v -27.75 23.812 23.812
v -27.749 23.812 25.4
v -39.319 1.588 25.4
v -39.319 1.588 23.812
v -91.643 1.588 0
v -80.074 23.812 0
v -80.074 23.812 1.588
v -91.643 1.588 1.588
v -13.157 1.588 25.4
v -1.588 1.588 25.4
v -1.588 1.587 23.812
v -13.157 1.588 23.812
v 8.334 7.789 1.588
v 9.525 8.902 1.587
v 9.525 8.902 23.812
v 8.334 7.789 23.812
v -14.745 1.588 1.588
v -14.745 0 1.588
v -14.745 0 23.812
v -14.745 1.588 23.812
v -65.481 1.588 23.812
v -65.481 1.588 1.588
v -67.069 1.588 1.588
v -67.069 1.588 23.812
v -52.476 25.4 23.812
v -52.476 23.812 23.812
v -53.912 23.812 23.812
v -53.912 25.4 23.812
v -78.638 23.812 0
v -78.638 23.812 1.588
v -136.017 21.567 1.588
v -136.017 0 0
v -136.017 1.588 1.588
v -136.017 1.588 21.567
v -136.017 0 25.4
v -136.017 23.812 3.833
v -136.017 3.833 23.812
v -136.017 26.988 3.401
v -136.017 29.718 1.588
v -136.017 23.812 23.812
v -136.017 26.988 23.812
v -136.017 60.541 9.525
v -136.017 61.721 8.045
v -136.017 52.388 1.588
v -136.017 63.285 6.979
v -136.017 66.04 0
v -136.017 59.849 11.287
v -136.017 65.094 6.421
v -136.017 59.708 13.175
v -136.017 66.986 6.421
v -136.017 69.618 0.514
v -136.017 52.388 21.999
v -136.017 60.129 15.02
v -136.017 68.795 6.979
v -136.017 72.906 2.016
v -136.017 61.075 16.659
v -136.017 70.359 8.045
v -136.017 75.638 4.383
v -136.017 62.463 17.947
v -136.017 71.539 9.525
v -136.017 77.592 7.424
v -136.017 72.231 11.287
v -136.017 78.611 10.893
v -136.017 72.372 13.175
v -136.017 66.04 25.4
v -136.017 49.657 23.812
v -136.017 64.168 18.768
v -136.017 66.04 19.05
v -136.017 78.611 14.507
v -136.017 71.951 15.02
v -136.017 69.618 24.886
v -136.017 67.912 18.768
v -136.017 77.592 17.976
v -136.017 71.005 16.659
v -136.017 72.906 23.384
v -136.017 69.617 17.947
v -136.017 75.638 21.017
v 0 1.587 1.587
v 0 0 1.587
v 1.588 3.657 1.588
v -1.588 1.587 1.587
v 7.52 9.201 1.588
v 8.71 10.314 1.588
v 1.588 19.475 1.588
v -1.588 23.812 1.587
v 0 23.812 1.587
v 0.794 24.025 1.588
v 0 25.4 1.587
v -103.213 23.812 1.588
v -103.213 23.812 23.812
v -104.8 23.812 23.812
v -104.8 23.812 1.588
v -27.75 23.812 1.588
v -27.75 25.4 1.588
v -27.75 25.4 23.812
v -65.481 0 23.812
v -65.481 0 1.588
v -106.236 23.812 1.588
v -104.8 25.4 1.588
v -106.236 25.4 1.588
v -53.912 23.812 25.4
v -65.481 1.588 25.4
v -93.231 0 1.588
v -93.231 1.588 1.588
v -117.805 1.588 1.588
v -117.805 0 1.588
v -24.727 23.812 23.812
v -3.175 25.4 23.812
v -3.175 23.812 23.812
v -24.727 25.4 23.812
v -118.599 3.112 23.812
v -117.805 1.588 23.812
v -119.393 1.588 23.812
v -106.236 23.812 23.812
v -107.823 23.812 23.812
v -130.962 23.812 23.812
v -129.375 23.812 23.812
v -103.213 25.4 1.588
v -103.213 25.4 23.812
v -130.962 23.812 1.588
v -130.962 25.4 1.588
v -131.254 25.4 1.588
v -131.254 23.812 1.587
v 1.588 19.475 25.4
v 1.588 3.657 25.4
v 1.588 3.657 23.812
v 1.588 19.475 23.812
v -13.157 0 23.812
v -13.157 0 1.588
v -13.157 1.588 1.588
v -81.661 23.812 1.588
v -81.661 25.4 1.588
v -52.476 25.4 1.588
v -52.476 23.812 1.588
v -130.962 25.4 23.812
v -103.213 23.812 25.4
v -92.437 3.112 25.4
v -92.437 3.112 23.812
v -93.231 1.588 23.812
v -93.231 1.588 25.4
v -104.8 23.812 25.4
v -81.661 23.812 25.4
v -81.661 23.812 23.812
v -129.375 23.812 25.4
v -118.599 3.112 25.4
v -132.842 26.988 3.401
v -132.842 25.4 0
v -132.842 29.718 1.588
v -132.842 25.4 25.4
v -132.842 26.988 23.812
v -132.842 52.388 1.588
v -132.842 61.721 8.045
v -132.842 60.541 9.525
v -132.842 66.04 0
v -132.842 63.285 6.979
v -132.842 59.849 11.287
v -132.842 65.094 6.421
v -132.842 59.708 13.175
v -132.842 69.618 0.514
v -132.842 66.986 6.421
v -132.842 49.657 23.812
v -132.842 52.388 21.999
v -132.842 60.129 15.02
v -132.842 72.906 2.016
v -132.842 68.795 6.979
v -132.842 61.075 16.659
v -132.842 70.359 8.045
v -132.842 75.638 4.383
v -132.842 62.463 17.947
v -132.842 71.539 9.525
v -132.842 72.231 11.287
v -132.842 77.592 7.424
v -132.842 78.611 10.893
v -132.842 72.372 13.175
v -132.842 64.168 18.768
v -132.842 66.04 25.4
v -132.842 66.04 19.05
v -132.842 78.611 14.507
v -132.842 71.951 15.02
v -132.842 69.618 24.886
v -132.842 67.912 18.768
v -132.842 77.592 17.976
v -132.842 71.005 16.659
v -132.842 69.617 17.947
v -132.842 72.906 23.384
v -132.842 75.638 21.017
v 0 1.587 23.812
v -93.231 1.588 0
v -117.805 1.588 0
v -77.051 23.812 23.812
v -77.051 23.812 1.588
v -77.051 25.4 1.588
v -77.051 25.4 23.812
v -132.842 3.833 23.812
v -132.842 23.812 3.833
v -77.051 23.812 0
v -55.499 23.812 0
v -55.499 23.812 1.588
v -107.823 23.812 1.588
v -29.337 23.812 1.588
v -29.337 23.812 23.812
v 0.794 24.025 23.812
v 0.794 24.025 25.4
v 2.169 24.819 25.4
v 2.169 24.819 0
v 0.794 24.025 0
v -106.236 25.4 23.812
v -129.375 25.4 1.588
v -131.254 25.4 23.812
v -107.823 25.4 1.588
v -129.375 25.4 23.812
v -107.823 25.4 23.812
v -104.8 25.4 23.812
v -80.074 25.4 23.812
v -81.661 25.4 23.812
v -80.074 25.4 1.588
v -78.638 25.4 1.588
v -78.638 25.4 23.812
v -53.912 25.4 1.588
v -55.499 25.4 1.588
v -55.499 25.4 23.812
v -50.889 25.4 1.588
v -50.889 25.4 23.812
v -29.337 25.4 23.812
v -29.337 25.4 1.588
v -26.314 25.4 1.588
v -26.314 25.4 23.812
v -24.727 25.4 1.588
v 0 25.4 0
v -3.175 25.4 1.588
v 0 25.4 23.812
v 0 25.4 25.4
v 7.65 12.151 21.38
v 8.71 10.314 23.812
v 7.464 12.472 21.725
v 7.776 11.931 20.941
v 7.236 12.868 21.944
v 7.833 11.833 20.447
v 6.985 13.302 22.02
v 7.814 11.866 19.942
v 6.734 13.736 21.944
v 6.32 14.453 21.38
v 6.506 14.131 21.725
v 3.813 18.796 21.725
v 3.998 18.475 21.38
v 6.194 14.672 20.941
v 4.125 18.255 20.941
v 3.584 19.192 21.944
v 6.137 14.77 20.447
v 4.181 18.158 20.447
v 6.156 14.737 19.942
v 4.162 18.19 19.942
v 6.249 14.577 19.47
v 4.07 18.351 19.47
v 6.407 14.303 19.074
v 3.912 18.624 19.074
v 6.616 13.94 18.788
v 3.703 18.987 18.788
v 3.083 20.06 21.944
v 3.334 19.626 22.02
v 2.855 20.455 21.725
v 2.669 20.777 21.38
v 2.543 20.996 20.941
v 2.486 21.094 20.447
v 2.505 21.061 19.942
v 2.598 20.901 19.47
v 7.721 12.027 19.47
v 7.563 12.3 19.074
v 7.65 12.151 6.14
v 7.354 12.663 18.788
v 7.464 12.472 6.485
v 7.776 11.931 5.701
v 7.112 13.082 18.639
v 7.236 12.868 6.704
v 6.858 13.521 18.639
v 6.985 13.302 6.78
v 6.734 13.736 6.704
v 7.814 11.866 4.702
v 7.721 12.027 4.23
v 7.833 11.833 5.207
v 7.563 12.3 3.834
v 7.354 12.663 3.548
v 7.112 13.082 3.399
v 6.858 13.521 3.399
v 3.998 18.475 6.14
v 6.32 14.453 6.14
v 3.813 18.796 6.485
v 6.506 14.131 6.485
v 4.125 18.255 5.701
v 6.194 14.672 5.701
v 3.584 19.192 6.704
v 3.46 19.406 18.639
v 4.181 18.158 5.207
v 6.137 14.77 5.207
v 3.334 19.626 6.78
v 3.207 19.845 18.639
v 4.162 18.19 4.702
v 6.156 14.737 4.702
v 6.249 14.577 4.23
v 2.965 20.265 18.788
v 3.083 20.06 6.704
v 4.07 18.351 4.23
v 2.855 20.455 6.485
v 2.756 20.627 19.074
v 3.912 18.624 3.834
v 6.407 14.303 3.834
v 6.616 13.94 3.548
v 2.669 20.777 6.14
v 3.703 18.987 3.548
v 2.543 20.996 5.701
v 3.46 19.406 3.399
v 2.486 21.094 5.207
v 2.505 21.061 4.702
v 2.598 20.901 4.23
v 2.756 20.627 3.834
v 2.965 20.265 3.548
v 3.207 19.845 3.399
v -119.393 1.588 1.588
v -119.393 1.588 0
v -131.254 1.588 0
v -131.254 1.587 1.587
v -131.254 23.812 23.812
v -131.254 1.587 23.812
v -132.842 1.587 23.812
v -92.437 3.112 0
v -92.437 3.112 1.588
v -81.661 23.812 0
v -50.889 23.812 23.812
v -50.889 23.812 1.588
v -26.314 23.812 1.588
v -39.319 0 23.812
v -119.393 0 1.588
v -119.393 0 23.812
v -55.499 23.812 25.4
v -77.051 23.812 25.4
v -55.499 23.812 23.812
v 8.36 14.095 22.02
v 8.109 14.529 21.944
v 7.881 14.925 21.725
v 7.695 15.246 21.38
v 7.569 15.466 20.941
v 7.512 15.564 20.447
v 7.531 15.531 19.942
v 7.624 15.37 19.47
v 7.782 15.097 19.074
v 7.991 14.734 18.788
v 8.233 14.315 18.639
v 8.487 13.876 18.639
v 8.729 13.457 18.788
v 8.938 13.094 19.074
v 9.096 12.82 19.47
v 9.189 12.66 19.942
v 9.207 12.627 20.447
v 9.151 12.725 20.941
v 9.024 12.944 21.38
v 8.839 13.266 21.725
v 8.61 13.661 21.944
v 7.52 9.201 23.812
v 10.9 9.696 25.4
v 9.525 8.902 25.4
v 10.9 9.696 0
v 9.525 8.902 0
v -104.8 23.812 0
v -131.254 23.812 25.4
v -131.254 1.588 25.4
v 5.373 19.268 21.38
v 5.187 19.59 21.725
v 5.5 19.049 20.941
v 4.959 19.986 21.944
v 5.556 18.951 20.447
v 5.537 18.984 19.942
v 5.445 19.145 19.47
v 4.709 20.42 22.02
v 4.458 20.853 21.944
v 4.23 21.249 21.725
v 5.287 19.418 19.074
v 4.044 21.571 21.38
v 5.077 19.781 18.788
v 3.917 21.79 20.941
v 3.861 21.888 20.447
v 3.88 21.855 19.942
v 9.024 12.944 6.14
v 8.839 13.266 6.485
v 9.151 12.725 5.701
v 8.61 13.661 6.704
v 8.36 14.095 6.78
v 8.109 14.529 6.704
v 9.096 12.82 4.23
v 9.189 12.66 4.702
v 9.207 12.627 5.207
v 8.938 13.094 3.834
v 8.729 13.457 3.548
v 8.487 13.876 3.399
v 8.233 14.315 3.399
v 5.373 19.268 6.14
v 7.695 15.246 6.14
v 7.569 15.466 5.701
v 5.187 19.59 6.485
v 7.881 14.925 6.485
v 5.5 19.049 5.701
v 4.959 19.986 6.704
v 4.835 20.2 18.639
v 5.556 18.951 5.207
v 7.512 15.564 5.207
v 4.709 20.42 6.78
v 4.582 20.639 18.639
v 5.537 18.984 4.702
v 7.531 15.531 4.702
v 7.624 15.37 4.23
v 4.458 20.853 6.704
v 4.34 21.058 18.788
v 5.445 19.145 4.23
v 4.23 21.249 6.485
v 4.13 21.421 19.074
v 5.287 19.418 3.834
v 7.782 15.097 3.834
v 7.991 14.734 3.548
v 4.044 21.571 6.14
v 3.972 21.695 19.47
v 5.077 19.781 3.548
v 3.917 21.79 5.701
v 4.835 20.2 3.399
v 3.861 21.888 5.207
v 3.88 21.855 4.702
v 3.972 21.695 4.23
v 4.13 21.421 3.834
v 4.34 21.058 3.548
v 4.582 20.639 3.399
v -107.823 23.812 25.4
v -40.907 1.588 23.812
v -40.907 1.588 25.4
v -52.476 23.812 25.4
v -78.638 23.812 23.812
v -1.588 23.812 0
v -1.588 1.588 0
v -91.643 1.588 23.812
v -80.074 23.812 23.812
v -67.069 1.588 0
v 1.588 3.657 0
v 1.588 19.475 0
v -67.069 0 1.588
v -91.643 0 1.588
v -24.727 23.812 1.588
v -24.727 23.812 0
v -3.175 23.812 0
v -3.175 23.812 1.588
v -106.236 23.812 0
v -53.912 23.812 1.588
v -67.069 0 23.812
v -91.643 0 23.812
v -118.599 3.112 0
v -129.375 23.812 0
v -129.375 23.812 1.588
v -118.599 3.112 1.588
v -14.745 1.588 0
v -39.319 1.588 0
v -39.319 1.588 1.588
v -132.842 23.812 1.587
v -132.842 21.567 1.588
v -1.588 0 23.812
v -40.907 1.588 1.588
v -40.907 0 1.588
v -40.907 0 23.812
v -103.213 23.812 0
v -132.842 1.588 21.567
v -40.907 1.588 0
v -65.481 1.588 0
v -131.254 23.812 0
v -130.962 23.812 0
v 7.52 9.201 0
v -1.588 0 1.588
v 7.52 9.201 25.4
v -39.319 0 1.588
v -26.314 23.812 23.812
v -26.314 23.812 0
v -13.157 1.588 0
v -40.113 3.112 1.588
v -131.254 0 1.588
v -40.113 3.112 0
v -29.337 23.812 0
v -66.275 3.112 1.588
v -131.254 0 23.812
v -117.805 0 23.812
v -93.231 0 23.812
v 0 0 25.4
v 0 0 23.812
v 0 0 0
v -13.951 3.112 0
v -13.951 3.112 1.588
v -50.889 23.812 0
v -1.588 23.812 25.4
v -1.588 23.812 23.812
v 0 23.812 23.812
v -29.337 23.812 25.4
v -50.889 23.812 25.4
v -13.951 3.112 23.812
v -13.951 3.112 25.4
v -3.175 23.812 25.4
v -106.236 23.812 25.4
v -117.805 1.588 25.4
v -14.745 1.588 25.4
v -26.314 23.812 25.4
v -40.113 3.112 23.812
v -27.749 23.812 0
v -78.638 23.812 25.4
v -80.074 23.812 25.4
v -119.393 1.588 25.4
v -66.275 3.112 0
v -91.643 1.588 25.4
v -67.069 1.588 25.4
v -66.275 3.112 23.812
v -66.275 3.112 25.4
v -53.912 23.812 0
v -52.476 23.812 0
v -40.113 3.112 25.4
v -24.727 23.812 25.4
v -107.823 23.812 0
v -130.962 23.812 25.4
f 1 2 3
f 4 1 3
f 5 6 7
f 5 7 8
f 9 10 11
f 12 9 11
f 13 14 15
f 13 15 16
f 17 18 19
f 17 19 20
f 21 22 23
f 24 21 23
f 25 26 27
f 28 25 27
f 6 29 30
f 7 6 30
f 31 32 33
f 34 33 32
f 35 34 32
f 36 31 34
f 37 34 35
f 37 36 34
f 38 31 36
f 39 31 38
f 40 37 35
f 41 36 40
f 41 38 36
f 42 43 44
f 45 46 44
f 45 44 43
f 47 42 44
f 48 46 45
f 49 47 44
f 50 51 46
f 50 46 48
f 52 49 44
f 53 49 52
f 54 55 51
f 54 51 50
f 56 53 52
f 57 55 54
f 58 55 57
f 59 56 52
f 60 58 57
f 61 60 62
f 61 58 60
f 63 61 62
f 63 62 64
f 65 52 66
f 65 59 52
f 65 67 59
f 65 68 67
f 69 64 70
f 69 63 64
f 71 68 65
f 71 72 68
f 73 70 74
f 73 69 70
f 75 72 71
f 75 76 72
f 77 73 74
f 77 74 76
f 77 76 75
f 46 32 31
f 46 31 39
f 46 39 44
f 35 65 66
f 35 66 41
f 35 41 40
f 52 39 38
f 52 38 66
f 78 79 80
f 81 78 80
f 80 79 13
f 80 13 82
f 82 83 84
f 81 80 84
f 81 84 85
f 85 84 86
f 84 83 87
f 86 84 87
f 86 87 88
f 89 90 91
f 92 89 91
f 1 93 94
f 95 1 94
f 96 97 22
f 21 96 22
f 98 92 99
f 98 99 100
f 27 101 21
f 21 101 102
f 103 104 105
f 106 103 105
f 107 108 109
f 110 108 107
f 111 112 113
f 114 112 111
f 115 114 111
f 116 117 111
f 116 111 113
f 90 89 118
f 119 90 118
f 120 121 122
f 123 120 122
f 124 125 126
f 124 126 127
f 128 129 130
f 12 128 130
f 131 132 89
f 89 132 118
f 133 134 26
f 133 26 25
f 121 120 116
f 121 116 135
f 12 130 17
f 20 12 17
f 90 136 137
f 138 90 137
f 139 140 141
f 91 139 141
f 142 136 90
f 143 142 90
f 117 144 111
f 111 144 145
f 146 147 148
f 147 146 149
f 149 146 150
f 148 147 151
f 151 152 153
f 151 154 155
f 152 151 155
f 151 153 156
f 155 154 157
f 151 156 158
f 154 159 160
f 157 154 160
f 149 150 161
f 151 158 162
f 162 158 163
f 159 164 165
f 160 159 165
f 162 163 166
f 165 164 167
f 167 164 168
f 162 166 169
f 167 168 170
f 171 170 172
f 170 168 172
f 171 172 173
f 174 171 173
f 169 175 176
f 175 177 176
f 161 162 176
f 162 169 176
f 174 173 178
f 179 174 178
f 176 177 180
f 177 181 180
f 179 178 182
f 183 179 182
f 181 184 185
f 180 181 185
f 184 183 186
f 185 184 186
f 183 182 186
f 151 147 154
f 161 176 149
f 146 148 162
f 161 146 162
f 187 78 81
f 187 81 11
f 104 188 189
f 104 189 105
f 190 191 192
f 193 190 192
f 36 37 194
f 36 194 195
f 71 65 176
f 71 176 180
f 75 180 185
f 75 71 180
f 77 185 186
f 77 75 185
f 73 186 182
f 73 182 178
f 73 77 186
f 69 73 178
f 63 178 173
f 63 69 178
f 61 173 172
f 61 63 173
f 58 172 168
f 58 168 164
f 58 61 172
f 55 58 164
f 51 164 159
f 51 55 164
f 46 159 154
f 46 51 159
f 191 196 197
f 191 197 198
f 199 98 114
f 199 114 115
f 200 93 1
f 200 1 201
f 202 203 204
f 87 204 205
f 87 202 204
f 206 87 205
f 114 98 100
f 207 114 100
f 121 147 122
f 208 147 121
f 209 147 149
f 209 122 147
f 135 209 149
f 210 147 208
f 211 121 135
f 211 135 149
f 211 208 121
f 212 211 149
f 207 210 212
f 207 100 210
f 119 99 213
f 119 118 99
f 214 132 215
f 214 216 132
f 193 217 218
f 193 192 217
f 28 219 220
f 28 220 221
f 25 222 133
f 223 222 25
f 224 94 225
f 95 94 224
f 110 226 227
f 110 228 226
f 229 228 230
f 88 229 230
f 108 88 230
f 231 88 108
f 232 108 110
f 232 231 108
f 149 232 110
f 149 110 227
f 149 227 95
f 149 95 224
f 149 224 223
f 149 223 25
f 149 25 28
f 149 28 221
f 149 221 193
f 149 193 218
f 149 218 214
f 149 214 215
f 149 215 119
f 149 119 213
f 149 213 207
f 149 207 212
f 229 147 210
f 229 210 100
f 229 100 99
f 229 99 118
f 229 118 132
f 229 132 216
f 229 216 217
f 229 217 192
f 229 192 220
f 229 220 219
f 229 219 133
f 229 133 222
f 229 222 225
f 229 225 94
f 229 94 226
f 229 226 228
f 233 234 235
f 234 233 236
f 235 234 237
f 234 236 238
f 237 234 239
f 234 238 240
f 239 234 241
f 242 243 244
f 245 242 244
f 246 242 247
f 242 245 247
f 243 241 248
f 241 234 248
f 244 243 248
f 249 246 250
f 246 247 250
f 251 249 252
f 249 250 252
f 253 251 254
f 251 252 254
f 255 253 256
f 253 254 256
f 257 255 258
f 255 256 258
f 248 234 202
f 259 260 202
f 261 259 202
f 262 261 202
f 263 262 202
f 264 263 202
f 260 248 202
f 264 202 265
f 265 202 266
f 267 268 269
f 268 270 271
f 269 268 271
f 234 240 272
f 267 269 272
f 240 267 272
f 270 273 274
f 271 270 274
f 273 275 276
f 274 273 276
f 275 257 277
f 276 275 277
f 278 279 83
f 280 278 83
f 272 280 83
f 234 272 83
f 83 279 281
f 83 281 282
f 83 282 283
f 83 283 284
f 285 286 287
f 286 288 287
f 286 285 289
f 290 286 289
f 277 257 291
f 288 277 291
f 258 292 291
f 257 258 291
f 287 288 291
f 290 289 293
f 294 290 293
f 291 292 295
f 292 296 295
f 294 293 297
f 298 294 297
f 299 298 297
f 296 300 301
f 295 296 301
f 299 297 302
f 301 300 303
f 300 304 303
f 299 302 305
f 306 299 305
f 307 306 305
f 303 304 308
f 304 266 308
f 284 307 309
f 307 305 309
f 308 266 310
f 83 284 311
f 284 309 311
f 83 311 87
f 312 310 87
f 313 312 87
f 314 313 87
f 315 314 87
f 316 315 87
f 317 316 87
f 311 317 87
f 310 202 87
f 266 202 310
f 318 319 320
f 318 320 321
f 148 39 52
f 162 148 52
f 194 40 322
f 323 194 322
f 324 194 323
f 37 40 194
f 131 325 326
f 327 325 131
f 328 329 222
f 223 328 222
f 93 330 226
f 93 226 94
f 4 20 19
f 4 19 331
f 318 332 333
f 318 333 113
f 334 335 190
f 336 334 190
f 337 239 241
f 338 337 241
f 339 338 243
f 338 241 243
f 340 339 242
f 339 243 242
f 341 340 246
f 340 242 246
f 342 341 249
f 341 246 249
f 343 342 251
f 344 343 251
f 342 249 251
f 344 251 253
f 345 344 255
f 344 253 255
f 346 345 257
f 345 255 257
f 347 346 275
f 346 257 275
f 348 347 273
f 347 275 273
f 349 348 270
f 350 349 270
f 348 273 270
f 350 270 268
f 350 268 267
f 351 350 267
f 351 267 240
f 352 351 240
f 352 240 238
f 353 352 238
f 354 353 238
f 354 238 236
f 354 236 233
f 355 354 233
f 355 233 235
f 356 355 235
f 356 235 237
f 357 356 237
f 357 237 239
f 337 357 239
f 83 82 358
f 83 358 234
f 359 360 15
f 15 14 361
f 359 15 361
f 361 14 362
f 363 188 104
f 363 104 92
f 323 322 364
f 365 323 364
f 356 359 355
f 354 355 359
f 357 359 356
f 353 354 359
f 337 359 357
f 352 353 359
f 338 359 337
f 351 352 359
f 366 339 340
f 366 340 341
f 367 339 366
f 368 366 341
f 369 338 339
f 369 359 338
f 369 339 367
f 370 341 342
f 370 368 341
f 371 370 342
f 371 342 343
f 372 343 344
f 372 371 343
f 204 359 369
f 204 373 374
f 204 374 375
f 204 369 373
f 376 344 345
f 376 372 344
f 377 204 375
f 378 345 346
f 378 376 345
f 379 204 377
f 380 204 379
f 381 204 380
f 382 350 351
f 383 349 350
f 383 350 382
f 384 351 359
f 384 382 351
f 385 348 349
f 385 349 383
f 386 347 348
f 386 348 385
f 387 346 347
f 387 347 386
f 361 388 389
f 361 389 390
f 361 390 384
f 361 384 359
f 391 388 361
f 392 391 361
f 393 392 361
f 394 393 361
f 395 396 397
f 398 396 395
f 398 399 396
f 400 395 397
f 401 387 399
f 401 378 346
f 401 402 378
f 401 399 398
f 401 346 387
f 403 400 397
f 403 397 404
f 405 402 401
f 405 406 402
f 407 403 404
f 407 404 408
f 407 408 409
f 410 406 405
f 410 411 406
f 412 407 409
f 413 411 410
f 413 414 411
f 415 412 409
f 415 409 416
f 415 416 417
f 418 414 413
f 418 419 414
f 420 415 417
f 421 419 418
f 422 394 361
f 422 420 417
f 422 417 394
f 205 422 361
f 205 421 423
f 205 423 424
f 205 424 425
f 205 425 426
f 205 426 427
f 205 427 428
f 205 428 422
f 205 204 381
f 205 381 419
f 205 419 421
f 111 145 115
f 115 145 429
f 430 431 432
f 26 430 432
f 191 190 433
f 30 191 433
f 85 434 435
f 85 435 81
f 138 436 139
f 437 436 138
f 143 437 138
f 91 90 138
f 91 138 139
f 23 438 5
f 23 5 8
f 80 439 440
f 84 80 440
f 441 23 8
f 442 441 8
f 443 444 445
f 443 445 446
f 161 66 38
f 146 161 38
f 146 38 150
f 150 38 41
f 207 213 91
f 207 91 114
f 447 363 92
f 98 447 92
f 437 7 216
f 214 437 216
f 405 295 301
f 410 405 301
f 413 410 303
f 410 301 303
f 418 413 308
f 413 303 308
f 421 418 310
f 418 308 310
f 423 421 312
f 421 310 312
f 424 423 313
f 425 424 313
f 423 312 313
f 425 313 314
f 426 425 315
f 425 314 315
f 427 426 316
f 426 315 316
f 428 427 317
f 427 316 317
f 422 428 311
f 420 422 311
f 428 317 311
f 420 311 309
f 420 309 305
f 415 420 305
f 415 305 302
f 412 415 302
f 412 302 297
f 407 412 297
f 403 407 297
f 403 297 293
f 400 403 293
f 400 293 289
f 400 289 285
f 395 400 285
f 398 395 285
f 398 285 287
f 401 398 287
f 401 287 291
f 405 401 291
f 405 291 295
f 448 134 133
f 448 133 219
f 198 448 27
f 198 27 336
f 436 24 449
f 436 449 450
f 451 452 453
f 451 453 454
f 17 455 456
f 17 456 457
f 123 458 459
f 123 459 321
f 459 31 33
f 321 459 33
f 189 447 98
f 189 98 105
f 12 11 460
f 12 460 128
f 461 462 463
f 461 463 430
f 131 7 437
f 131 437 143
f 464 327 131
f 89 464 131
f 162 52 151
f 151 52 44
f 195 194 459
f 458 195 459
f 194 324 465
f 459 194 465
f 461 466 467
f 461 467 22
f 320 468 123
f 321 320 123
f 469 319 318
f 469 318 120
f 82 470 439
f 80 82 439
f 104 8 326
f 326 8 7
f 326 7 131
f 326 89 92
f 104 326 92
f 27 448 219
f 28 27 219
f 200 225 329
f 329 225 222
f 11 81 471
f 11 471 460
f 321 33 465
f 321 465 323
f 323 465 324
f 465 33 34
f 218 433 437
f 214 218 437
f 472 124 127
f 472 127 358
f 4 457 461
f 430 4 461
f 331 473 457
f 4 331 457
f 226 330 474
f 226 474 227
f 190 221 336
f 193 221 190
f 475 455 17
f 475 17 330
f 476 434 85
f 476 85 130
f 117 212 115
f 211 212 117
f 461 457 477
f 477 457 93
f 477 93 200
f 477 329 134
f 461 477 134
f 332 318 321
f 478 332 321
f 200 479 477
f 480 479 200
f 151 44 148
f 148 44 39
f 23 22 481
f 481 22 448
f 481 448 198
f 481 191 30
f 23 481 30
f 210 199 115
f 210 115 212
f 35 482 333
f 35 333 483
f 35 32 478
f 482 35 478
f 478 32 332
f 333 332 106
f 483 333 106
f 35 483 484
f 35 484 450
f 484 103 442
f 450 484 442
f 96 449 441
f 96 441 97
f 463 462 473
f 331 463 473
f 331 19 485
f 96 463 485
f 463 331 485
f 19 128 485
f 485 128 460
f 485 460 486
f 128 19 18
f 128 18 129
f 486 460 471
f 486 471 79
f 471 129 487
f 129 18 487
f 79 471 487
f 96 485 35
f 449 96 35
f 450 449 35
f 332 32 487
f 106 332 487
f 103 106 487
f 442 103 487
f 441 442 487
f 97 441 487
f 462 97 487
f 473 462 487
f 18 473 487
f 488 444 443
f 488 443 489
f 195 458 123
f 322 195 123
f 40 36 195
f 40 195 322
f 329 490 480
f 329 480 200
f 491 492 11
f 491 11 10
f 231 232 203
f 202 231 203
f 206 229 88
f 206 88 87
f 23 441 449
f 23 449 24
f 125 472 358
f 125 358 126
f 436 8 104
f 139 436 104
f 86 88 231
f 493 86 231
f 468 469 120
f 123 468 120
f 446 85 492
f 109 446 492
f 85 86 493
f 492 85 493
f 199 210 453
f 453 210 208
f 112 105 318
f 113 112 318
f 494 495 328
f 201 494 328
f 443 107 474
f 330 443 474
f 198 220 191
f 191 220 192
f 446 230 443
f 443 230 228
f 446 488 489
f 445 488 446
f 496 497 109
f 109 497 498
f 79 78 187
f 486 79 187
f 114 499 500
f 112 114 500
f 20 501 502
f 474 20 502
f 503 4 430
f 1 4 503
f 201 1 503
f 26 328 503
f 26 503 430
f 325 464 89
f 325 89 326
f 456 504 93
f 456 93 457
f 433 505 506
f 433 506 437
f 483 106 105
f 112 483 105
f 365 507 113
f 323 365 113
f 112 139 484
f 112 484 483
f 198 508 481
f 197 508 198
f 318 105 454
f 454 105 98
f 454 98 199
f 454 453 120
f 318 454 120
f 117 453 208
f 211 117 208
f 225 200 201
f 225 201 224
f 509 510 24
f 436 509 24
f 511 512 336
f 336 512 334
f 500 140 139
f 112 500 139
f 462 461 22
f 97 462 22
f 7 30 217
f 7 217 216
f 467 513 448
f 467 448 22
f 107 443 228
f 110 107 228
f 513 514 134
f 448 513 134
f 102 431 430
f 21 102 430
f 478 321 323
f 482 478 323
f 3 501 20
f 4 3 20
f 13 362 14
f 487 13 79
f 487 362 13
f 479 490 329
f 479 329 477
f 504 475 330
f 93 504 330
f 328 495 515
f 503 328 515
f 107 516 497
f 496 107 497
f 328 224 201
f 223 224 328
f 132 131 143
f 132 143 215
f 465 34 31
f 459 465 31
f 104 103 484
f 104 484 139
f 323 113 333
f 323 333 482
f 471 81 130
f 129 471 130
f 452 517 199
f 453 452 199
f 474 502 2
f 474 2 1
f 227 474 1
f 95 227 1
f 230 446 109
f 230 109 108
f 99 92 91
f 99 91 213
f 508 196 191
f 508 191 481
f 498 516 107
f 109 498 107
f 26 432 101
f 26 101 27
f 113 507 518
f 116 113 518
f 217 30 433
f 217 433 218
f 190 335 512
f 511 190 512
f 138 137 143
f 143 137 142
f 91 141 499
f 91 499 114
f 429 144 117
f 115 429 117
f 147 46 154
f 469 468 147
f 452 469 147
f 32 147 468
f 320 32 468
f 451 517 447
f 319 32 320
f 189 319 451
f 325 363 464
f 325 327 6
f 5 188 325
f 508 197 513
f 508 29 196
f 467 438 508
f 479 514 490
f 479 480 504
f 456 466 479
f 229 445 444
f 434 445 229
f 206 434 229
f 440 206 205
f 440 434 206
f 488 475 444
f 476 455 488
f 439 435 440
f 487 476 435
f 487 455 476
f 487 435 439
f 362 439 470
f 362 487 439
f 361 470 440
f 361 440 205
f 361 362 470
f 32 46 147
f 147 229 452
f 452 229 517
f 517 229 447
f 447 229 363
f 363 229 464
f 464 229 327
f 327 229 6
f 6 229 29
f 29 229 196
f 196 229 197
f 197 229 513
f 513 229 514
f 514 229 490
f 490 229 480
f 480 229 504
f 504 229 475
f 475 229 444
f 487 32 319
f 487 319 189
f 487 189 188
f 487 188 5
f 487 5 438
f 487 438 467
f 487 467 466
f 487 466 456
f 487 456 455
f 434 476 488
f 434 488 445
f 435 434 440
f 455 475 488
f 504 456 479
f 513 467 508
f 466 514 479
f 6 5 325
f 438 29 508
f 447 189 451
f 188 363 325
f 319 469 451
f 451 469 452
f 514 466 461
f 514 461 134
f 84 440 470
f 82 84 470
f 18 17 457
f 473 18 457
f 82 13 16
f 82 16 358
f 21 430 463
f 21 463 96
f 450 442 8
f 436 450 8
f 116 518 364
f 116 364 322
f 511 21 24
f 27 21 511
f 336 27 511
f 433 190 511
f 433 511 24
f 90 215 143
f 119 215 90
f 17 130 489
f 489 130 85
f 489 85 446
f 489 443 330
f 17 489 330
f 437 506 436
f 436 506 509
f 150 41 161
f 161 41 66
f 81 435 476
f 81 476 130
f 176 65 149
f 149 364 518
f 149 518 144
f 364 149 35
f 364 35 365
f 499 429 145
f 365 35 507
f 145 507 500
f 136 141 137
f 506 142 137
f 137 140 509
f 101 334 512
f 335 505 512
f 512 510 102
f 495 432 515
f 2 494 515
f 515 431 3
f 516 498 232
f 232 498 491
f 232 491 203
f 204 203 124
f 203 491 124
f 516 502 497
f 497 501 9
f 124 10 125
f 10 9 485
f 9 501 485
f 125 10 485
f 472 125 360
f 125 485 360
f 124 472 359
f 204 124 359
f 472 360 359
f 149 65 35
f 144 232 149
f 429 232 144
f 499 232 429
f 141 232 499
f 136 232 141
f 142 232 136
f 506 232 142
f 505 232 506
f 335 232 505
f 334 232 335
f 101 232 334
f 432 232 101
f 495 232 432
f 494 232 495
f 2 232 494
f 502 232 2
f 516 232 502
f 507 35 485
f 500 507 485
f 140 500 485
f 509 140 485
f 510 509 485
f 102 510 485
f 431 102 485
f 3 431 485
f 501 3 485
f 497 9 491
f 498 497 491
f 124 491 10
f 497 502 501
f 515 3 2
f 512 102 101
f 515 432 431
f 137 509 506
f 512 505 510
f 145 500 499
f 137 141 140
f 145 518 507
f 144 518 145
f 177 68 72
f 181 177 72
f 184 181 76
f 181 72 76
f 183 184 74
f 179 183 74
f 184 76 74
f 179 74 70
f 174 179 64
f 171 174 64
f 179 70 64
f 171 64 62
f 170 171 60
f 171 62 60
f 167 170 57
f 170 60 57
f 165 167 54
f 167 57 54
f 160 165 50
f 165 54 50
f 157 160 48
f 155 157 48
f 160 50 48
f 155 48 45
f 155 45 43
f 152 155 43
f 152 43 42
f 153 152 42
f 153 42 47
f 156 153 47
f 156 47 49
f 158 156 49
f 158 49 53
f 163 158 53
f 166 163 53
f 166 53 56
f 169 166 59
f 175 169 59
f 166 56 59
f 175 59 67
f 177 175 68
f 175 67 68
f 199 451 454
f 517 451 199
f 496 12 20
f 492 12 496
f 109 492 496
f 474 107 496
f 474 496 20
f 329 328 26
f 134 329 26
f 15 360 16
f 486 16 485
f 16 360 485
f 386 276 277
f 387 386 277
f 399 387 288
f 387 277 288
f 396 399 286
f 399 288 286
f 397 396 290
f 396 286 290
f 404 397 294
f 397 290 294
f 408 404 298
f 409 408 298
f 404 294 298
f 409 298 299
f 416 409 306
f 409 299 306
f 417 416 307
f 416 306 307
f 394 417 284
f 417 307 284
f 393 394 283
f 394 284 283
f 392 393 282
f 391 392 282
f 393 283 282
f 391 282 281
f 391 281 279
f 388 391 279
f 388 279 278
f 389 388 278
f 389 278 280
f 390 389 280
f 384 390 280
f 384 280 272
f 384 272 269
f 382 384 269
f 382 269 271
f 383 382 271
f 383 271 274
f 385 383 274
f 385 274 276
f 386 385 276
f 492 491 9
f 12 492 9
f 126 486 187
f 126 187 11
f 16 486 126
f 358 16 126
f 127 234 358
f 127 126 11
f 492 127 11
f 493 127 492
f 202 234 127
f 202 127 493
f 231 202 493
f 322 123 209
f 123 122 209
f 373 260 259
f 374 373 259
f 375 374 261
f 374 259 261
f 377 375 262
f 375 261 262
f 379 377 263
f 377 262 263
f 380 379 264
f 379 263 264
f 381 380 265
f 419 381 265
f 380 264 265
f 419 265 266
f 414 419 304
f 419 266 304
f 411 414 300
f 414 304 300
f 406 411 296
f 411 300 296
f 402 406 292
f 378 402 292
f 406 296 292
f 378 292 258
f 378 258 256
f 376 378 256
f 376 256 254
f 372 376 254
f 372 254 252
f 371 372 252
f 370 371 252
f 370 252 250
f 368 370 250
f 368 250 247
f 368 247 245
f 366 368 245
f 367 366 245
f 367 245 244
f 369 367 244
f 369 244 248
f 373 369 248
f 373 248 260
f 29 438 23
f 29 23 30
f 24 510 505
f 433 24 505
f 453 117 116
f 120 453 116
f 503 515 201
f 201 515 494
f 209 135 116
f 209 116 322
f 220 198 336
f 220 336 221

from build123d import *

# Parameters (mm, degrees)
BOSS_EXTRUDE1_DEPTH      = 1.5875
SKETCH2_W                = 1.5875
SKETCH2_H                = 1.5875
BOSS_EXTRUDE2_DEPTH      = 132.842
SKETCH3_W                = 25.4
SKETCH3_H                = 25.4
SKETCH3_W_2              = 22.225
SKETCH3_H_2              = 22.225
BOSS_EXTRUDE3_DEPTH      = 1.5875
BOSS_EXTRUDE4_START      = -1.5875
BOSS_EXTRUDE4_DEPTH      = 22.225
BOSS_EXTRUDE5_DEPTH      = 1.5875
LPATTERN1_COUNT          = 5
LPATTERN1_PITCH          = 26.162
MIRROR6_COPY_1_DEPTH     = 1.5875
MIRROR6_COPY_2_DEPTH     = 1.5875
MIRROR6_COPY_3_DEPTH     = 1.5875
MIRROR6_COPY_4_DEPTH     = 1.5875
BOSS_EXTRUDE6_START      = -1.5875
SKETCH10_W               = 1.5875
SKETCH10_H               = 1.5875
BOSS_EXTRUDE6_DEPTH      = 22.225
LPATTERN2_COUNT          = 5
LPATTERN2_PITCH          = 26.162
SKETCH12_W               = 25.4
SKETCH12_H               = 17.4625
BOSS_EXTRUDE13_DEPTH     = 1.5875
M3_CLEARANCE_HOLE1_D     = 3.4
M3_CLEARANCE_HOLE1_DEPTH = 1.5875
SKETCH19_W               = 3.175
SKETCH19_H               = 25.4
BOSS_EXTRUDE14_DEPTH     = 66.04
BOSS_EXTRUDE15_DEPTH     = 3.175
SKETCH21_R               = 6.35
CUT_EXTRUDE1_DEPTH       = 3.175


with BuildPart() as part:
    # Sketch1 → Boss-Extrude1 (new body)
    with BuildSketch(Plane.XY):
        Polygon((0, 0), (0, 25.4), (9.525, 8.902216058), align=None)
        Polygon((7.519534439, 9.200784302), (1.5875, 3.656610839), (1.5875, 19.475369343), align=None, mode=Mode.SUBTRACT)
    extrude(amount=BOSS_EXTRUDE1_DEPTH)

    # Sketch2 → Boss-Extrude2 (add)
    with BuildSketch(Plane.ZY):
        with Locations((0.79375, 24.60625)):
            Rectangle(SKETCH2_W, SKETCH2_H)
        with Locations((0.79375, 0.79375)):
            Rectangle(SKETCH2_W, SKETCH2_H)
    extrude(amount=BOSS_EXTRUDE2_DEPTH)

    # Sketch3 → Boss-Extrude3 (add)
    with BuildSketch(Plane.ZY.offset(132.842)):
        with Locations((12.7, 12.7)):
            Rectangle(SKETCH3_W, SKETCH3_H)
        with Locations((12.7, 12.7)):
            Rectangle(SKETCH3_W_2, SKETCH3_H_2, mode=Mode.SUBTRACT)
    boss_extrude3 = extrude(amount=-BOSS_EXTRUDE3_DEPTH)

    # Mirror4: part across plane


with BuildPart() as part_1:
    add(part.part)
    add(part.part.mirror(Plane.XY.offset(12.7)))

    # Mirror5: Boss-Extrude3 across plane
    add(boss_extrude3.mirror(Plane(origin=(-66.421, 0, 0), x_dir=(0, 0, 1), z_dir=(1, 0, 0))))

    # Sketch7 → Boss-Extrude4 (add)
    with BuildSketch(Plane(origin=(0, 0, 0), x_dir=(-1, 0, 0), z_dir=(0, 0, -1)).offset(BOSS_EXTRUDE4_START)):
        Polygon((-9.525, 8.902216058), (-8.334375, 7.789439051), (-7.519534439, 9.200784302), (-8.710159439, 10.313561309), align=None)
    extrude(amount=-BOSS_EXTRUDE4_DEPTH)

    # Sketch9 → Boss-Extrude5 (add)
    with BuildSketch(Plane(origin=(0, 0, 0), x_dir=(-1, 0, 0), z_dir=(0, 0, -1))):
        Polygon((1.5875, 23.8125), (13.157102699, 1.5875), (14.744602699, 1.5875), (26.314205397, 23.8125), (24.726705397, 23.8125), (13.950852699, 3.112279563), (3.175, 23.8125), align=None)
    boss_extrude5 = extrude(amount=-BOSS_EXTRUDE5_DEPTH)

    # LPattern1: Boss-Extrude5 ×5
    with Locations(*[(-i * LPATTERN1_PITCH, 0, 0) for i in range(1, LPATTERN1_COUNT)]):
        add(boss_extrude5)

    # Mirror6: Boss-Extrude5 across plane
    add(boss_extrude5.mirror(Plane.XY.offset(12.7)))

    # Mirror6 copy 1 sketch → Mirror6 copy 1 (add)
    with BuildSketch(Plane(origin=(-26.162, 0, 25.4), x_dir=(-1, 0, 0), z_dir=(0, 0, 1))):
        Polygon((1.5875, -23.8125), (13.157102699, -1.5875), (14.744602699, -1.5875), (26.314205397, -23.8125), (24.726705397, -23.8125), (13.950852699, -3.112279563), (3.175, -23.8125), align=None)
    extrude(amount=-MIRROR6_COPY_1_DEPTH)

    # Mirror6 copy 2 sketch → Mirror6 copy 2 (add)
    with BuildSketch(Plane(origin=(-52.324, 0, 25.4), x_dir=(-1, 0, 0), z_dir=(0, 0, 1))):
        Polygon((1.5875, -23.8125), (13.157102699, -1.5875), (14.744602699, -1.5875), (26.314205397, -23.8125), (24.726705397, -23.8125), (13.950852699, -3.112279563), (3.175, -23.8125), align=None)
    extrude(amount=-MIRROR6_COPY_2_DEPTH)

    # Mirror6 copy 3 sketch → Mirror6 copy 3 (add)
    with BuildSketch(Plane(origin=(-78.486, 0, 25.4), x_dir=(-1, 0, 0), z_dir=(0, 0, 1))):
        Polygon((1.5875, -23.8125), (13.157102699, -1.5875), (14.744602699, -1.5875), (26.314205397, -23.8125), (24.726705397, -23.8125), (13.950852699, -3.112279563), (3.175, -23.8125), align=None)
    extrude(amount=-MIRROR6_COPY_3_DEPTH)

    # Mirror6 copy 4 sketch → Mirror6 copy 4 (add)
    with BuildSketch(Plane(origin=(-104.648, 0, 25.4), x_dir=(-1, 0, 0), z_dir=(0, 0, 1))):
        Polygon((1.5875, -23.8125), (13.157102699, -1.5875), (14.744602699, -1.5875), (26.314205397, -23.8125), (24.726705397, -23.8125), (13.950852699, -3.112279563), (3.175, -23.8125), align=None)
    extrude(amount=-MIRROR6_COPY_4_DEPTH)

    # Sketch10 → Boss-Extrude6 (add)
    with BuildSketch(Plane(origin=(0, 0, 0), x_dir=(-1, 0, 0), z_dir=(0, 0, -1)).offset(BOSS_EXTRUDE6_START)):
        with Locations((118.598852699, 0.79375)):
            Rectangle(SKETCH10_W, SKETCH10_H)
        with Locations((130.168455397, 24.60625)):
            Rectangle(SKETCH10_W, SKETCH10_H)
        with Locations((107.02925, 24.60625)):
            Rectangle(SKETCH10_W, SKETCH10_H)
    boss_extrude6 = extrude(amount=-BOSS_EXTRUDE6_DEPTH)

    # LPattern2: Boss-Extrude6 ×5
    with Locations(*[(i * LPATTERN2_PITCH, 0, 0) for i in range(1, LPATTERN2_COUNT)]):
        add(boss_extrude6)

    # Sketch12 → Boss-Extrude13 (add)
    with BuildSketch(Plane(origin=(10.998522628, 6.35, 0), x_dir=(0, 0, -1), z_dir=(0.8660254037844415, 0.49999999999999506, 0))):
        with Locations((-12.7, 11.678295256)):
            Rectangle(SKETCH12_W, SKETCH12_H)
    extrude(amount=BOSS_EXTRUDE13_DEPTH)

    # M3 Clearance Hole1
    with Locations(Plane(origin=(12.373337957, 7.14375, 0), x_dir=(0, 0, -1), z_dir=(0.8660254037844414, 0.49999999999999517, 0))):
        with Locations((-20.32, 15.329545256), (-20.32, 8.027045256), (-5.08, 15.329545256), (-5.08, 8.027045256)):
            Hole(M3_CLEARANCE_HOLE1_D / 2, depth=M3_CLEARANCE_HOLE1_DEPTH)

    # Sketch19 → Boss-Extrude14 (add)
    with BuildSketch(Plane(origin=(0, 0, 0), x_dir=(1, 0, 0), z_dir=(0, 1, 0))):
        with Locations((-134.4295, -12.7)):
            Rectangle(SKETCH19_W, SKETCH19_H)
    extrude(amount=BOSS_EXTRUDE14_DEPTH)

    # Sketch20 → Boss-Extrude15 (add)
    with BuildSketch(Plane.ZY.offset(136.017)):
        with BuildLine():
            Line((0, 66.04), (25.4, 66.04))
            ThreePointArc((25.4, 66.04), (12.7, 78.74), (0, 66.04))
        make_face()
    extrude(amount=-BOSS_EXTRUDE15_DEPTH)

    # Sketch21 → Cut-Extrude1 (cut)
    with BuildSketch(Plane.ZY.offset(136.017)):
        with Locations((12.7, 66.04)):
            Circle(SKETCH21_R)
        Polygon((1.5875, 29.718299952), (21.998939404, 52.3875), (1.5875, 52.3875), align=None)
        Polygon((1.5875, 1.5875), (21.56743597, 1.5875), (1.5875, 21.56743597), align=None)
        Polygon((3.83256403, 23.8125), (23.8125, 23.8125), (23.8125, 3.83256403), align=None)
        Polygon((3.401060596, 26.9875), (23.8125, 26.9875), (23.8125, 49.656700048), align=None)
    extrude(amount=-CUT_EXTRUDE1_DEPTH, mode=Mode.SUBTRACT)


solid = part_1.part
